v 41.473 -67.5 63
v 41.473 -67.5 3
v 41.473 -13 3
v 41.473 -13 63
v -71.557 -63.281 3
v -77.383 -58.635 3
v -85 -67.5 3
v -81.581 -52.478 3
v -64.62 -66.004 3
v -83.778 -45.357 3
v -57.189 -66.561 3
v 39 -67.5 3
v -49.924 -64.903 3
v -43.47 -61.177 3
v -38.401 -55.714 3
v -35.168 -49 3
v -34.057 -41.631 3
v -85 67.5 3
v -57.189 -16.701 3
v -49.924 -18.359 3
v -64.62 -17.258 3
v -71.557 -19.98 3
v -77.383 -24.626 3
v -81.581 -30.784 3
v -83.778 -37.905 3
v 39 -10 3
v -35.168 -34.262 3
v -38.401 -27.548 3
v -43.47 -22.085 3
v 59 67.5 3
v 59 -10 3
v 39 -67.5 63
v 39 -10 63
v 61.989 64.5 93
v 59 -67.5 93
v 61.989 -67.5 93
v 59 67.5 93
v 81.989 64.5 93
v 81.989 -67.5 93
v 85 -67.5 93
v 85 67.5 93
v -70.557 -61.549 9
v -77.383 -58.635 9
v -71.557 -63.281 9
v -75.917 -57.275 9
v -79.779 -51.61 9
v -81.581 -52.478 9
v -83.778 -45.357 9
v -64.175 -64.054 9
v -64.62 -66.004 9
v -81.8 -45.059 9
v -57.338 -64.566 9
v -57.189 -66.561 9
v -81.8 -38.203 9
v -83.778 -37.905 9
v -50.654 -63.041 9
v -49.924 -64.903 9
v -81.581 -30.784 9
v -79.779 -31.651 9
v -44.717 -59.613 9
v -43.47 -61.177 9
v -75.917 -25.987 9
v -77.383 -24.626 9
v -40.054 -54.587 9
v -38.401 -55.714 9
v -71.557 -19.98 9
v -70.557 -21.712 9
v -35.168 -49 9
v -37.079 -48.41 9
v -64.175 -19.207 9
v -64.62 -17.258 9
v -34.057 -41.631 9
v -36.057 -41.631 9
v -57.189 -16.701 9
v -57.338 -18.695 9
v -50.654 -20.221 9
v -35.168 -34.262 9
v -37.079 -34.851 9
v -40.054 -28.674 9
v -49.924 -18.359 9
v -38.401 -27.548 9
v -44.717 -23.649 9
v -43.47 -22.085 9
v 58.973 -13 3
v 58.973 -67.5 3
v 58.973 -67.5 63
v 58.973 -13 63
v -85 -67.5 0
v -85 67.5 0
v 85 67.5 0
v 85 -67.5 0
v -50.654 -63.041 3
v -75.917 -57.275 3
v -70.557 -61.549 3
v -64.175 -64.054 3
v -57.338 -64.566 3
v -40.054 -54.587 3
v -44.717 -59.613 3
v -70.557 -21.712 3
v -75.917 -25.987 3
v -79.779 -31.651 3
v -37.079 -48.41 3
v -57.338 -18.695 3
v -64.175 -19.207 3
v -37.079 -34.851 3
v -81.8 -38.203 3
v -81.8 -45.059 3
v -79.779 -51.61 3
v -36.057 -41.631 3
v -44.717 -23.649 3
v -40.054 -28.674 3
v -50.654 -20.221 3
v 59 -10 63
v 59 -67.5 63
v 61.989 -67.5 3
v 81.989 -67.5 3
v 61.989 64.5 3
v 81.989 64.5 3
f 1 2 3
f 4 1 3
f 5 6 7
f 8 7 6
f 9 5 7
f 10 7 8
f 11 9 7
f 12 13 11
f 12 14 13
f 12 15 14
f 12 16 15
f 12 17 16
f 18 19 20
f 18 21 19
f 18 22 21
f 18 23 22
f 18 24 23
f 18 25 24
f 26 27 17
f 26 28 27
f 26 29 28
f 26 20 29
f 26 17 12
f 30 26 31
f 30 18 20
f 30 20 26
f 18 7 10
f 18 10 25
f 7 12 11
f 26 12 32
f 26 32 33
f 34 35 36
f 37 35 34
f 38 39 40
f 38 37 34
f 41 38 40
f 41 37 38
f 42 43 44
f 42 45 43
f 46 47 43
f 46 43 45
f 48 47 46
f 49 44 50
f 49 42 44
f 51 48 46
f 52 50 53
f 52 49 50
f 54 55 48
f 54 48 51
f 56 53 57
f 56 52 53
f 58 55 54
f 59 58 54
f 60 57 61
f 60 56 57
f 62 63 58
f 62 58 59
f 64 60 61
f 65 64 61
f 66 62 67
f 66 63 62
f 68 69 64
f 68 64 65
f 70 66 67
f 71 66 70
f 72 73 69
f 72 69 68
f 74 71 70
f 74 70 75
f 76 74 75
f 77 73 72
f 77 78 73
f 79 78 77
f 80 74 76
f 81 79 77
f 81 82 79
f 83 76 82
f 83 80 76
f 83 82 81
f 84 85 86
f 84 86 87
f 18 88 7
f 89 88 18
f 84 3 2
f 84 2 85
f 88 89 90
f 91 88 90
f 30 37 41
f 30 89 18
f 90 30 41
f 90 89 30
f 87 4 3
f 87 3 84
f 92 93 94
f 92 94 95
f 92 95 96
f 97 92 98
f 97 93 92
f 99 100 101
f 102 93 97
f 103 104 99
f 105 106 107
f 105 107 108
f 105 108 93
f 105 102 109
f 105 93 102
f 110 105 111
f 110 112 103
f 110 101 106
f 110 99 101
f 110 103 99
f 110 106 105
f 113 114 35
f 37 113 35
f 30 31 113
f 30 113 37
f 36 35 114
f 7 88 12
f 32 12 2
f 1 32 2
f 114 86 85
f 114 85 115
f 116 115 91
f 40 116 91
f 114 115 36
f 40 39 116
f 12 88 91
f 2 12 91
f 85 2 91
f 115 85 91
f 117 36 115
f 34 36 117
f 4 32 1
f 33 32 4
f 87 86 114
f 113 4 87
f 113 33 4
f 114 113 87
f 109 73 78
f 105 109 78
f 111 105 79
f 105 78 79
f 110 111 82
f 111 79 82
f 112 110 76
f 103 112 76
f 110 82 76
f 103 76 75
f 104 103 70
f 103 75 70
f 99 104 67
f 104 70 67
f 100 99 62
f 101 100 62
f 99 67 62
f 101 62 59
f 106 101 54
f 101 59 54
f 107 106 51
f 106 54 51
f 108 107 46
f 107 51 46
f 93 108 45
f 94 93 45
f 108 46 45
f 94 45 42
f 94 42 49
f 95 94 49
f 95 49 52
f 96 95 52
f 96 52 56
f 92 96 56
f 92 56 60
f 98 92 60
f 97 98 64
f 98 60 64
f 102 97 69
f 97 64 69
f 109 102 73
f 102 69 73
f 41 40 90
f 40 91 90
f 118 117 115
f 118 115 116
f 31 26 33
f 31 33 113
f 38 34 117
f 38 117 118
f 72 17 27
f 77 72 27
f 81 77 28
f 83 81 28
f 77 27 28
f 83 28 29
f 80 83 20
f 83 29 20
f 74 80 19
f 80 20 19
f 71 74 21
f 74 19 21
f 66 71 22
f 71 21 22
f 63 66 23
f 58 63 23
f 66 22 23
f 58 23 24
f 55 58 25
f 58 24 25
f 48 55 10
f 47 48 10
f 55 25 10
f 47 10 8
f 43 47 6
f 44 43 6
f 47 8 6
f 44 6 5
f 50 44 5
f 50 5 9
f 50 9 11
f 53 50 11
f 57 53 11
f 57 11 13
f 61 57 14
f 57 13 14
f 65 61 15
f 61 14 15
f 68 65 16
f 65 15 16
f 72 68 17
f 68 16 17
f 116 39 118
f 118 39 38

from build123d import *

# Parameters (mm, degrees)
SKETCH_W        = 170
SKETCH_H        = 135
PAD_DEPTH       = 3
SKETCH001_W     = 26
SKETCH001_H     = 135
PAD001_DEPTH    = 90
SKETCH004_W     = 20
SKETCH004_H     = 136.715439
POCKET_DEPTH    = 90
SKETCH006_W     = 20
SKETCH006_H     = 57.5
PAD002_DEPTH    = 60
SKETCH007_W     = 17.5
SKETCH007_H     = 54.5
POCKET001_DEPTH = 60
SKETCH008_R     = 25
PAD003_DEPTH    = 6
SKETCH009_R     = 23
POCKET002_DEPTH = 6


with BuildPart() as part:
    # Sketch → Pad (new body)
    with BuildSketch(Plane.XY):
        Rectangle(SKETCH_W, SKETCH_H)
    extrude(amount=PAD_DEPTH)

    # Sketch001 (on Face6 of Pad) → Pad001 (join)
    with BuildSketch(Plane.XY.offset(3)):
        with Locations((72, 0)):
            Rectangle(SKETCH001_W, SKETCH001_H)
    extrude(amount=PAD001_DEPTH)

    # Sketch004 (on Face10 of Pad001) → Pocket (cut)
    with BuildSketch(Plane.XY.offset(93)):
        with Locations((71.988623, -3.85772)):
            Rectangle(SKETCH004_W, SKETCH004_H)
    extrude(amount=-POCKET_DEPTH, mode=Mode.SUBTRACT)

    # Sketch006 (on Face5 of Pocket) → Pad002 (join)
    with BuildSketch(Plane.XY.offset(3)):
        with Locations((49, -38.75)):
            Rectangle(SKETCH006_W, SKETCH006_H)
    extrude(amount=PAD002_DEPTH)

    # Sketch007 (on Face17 of Pad002) → Pocket001 (cut)
    with BuildSketch(Plane.XY.offset(63)):
        with Locations((50.223179, -40.25)):
            Rectangle(SKETCH007_W, SKETCH007_H)
    extrude(amount=-POCKET001_DEPTH, mode=Mode.SUBTRACT)

    # Sketch008 (on Face5 of Pocket001) → Pad003 (join)
    with BuildSketch(Plane.XY.offset(3)):
        with Locations((-59.057144, -41.630726)):
            Circle(SKETCH008_R)
    extrude(amount=PAD003_DEPTH)

    # Sketch009 (on Face21 of Pad003) → Pocket002 (cut)
    with BuildSketch(Plane.XY.offset(9)):
        with Locations((-59.057144, -41.630726)):
            Circle(SKETCH009_R)
    extrude(amount=-POCKET002_DEPTH, mode=Mode.SUBTRACT)


solid = part.part
